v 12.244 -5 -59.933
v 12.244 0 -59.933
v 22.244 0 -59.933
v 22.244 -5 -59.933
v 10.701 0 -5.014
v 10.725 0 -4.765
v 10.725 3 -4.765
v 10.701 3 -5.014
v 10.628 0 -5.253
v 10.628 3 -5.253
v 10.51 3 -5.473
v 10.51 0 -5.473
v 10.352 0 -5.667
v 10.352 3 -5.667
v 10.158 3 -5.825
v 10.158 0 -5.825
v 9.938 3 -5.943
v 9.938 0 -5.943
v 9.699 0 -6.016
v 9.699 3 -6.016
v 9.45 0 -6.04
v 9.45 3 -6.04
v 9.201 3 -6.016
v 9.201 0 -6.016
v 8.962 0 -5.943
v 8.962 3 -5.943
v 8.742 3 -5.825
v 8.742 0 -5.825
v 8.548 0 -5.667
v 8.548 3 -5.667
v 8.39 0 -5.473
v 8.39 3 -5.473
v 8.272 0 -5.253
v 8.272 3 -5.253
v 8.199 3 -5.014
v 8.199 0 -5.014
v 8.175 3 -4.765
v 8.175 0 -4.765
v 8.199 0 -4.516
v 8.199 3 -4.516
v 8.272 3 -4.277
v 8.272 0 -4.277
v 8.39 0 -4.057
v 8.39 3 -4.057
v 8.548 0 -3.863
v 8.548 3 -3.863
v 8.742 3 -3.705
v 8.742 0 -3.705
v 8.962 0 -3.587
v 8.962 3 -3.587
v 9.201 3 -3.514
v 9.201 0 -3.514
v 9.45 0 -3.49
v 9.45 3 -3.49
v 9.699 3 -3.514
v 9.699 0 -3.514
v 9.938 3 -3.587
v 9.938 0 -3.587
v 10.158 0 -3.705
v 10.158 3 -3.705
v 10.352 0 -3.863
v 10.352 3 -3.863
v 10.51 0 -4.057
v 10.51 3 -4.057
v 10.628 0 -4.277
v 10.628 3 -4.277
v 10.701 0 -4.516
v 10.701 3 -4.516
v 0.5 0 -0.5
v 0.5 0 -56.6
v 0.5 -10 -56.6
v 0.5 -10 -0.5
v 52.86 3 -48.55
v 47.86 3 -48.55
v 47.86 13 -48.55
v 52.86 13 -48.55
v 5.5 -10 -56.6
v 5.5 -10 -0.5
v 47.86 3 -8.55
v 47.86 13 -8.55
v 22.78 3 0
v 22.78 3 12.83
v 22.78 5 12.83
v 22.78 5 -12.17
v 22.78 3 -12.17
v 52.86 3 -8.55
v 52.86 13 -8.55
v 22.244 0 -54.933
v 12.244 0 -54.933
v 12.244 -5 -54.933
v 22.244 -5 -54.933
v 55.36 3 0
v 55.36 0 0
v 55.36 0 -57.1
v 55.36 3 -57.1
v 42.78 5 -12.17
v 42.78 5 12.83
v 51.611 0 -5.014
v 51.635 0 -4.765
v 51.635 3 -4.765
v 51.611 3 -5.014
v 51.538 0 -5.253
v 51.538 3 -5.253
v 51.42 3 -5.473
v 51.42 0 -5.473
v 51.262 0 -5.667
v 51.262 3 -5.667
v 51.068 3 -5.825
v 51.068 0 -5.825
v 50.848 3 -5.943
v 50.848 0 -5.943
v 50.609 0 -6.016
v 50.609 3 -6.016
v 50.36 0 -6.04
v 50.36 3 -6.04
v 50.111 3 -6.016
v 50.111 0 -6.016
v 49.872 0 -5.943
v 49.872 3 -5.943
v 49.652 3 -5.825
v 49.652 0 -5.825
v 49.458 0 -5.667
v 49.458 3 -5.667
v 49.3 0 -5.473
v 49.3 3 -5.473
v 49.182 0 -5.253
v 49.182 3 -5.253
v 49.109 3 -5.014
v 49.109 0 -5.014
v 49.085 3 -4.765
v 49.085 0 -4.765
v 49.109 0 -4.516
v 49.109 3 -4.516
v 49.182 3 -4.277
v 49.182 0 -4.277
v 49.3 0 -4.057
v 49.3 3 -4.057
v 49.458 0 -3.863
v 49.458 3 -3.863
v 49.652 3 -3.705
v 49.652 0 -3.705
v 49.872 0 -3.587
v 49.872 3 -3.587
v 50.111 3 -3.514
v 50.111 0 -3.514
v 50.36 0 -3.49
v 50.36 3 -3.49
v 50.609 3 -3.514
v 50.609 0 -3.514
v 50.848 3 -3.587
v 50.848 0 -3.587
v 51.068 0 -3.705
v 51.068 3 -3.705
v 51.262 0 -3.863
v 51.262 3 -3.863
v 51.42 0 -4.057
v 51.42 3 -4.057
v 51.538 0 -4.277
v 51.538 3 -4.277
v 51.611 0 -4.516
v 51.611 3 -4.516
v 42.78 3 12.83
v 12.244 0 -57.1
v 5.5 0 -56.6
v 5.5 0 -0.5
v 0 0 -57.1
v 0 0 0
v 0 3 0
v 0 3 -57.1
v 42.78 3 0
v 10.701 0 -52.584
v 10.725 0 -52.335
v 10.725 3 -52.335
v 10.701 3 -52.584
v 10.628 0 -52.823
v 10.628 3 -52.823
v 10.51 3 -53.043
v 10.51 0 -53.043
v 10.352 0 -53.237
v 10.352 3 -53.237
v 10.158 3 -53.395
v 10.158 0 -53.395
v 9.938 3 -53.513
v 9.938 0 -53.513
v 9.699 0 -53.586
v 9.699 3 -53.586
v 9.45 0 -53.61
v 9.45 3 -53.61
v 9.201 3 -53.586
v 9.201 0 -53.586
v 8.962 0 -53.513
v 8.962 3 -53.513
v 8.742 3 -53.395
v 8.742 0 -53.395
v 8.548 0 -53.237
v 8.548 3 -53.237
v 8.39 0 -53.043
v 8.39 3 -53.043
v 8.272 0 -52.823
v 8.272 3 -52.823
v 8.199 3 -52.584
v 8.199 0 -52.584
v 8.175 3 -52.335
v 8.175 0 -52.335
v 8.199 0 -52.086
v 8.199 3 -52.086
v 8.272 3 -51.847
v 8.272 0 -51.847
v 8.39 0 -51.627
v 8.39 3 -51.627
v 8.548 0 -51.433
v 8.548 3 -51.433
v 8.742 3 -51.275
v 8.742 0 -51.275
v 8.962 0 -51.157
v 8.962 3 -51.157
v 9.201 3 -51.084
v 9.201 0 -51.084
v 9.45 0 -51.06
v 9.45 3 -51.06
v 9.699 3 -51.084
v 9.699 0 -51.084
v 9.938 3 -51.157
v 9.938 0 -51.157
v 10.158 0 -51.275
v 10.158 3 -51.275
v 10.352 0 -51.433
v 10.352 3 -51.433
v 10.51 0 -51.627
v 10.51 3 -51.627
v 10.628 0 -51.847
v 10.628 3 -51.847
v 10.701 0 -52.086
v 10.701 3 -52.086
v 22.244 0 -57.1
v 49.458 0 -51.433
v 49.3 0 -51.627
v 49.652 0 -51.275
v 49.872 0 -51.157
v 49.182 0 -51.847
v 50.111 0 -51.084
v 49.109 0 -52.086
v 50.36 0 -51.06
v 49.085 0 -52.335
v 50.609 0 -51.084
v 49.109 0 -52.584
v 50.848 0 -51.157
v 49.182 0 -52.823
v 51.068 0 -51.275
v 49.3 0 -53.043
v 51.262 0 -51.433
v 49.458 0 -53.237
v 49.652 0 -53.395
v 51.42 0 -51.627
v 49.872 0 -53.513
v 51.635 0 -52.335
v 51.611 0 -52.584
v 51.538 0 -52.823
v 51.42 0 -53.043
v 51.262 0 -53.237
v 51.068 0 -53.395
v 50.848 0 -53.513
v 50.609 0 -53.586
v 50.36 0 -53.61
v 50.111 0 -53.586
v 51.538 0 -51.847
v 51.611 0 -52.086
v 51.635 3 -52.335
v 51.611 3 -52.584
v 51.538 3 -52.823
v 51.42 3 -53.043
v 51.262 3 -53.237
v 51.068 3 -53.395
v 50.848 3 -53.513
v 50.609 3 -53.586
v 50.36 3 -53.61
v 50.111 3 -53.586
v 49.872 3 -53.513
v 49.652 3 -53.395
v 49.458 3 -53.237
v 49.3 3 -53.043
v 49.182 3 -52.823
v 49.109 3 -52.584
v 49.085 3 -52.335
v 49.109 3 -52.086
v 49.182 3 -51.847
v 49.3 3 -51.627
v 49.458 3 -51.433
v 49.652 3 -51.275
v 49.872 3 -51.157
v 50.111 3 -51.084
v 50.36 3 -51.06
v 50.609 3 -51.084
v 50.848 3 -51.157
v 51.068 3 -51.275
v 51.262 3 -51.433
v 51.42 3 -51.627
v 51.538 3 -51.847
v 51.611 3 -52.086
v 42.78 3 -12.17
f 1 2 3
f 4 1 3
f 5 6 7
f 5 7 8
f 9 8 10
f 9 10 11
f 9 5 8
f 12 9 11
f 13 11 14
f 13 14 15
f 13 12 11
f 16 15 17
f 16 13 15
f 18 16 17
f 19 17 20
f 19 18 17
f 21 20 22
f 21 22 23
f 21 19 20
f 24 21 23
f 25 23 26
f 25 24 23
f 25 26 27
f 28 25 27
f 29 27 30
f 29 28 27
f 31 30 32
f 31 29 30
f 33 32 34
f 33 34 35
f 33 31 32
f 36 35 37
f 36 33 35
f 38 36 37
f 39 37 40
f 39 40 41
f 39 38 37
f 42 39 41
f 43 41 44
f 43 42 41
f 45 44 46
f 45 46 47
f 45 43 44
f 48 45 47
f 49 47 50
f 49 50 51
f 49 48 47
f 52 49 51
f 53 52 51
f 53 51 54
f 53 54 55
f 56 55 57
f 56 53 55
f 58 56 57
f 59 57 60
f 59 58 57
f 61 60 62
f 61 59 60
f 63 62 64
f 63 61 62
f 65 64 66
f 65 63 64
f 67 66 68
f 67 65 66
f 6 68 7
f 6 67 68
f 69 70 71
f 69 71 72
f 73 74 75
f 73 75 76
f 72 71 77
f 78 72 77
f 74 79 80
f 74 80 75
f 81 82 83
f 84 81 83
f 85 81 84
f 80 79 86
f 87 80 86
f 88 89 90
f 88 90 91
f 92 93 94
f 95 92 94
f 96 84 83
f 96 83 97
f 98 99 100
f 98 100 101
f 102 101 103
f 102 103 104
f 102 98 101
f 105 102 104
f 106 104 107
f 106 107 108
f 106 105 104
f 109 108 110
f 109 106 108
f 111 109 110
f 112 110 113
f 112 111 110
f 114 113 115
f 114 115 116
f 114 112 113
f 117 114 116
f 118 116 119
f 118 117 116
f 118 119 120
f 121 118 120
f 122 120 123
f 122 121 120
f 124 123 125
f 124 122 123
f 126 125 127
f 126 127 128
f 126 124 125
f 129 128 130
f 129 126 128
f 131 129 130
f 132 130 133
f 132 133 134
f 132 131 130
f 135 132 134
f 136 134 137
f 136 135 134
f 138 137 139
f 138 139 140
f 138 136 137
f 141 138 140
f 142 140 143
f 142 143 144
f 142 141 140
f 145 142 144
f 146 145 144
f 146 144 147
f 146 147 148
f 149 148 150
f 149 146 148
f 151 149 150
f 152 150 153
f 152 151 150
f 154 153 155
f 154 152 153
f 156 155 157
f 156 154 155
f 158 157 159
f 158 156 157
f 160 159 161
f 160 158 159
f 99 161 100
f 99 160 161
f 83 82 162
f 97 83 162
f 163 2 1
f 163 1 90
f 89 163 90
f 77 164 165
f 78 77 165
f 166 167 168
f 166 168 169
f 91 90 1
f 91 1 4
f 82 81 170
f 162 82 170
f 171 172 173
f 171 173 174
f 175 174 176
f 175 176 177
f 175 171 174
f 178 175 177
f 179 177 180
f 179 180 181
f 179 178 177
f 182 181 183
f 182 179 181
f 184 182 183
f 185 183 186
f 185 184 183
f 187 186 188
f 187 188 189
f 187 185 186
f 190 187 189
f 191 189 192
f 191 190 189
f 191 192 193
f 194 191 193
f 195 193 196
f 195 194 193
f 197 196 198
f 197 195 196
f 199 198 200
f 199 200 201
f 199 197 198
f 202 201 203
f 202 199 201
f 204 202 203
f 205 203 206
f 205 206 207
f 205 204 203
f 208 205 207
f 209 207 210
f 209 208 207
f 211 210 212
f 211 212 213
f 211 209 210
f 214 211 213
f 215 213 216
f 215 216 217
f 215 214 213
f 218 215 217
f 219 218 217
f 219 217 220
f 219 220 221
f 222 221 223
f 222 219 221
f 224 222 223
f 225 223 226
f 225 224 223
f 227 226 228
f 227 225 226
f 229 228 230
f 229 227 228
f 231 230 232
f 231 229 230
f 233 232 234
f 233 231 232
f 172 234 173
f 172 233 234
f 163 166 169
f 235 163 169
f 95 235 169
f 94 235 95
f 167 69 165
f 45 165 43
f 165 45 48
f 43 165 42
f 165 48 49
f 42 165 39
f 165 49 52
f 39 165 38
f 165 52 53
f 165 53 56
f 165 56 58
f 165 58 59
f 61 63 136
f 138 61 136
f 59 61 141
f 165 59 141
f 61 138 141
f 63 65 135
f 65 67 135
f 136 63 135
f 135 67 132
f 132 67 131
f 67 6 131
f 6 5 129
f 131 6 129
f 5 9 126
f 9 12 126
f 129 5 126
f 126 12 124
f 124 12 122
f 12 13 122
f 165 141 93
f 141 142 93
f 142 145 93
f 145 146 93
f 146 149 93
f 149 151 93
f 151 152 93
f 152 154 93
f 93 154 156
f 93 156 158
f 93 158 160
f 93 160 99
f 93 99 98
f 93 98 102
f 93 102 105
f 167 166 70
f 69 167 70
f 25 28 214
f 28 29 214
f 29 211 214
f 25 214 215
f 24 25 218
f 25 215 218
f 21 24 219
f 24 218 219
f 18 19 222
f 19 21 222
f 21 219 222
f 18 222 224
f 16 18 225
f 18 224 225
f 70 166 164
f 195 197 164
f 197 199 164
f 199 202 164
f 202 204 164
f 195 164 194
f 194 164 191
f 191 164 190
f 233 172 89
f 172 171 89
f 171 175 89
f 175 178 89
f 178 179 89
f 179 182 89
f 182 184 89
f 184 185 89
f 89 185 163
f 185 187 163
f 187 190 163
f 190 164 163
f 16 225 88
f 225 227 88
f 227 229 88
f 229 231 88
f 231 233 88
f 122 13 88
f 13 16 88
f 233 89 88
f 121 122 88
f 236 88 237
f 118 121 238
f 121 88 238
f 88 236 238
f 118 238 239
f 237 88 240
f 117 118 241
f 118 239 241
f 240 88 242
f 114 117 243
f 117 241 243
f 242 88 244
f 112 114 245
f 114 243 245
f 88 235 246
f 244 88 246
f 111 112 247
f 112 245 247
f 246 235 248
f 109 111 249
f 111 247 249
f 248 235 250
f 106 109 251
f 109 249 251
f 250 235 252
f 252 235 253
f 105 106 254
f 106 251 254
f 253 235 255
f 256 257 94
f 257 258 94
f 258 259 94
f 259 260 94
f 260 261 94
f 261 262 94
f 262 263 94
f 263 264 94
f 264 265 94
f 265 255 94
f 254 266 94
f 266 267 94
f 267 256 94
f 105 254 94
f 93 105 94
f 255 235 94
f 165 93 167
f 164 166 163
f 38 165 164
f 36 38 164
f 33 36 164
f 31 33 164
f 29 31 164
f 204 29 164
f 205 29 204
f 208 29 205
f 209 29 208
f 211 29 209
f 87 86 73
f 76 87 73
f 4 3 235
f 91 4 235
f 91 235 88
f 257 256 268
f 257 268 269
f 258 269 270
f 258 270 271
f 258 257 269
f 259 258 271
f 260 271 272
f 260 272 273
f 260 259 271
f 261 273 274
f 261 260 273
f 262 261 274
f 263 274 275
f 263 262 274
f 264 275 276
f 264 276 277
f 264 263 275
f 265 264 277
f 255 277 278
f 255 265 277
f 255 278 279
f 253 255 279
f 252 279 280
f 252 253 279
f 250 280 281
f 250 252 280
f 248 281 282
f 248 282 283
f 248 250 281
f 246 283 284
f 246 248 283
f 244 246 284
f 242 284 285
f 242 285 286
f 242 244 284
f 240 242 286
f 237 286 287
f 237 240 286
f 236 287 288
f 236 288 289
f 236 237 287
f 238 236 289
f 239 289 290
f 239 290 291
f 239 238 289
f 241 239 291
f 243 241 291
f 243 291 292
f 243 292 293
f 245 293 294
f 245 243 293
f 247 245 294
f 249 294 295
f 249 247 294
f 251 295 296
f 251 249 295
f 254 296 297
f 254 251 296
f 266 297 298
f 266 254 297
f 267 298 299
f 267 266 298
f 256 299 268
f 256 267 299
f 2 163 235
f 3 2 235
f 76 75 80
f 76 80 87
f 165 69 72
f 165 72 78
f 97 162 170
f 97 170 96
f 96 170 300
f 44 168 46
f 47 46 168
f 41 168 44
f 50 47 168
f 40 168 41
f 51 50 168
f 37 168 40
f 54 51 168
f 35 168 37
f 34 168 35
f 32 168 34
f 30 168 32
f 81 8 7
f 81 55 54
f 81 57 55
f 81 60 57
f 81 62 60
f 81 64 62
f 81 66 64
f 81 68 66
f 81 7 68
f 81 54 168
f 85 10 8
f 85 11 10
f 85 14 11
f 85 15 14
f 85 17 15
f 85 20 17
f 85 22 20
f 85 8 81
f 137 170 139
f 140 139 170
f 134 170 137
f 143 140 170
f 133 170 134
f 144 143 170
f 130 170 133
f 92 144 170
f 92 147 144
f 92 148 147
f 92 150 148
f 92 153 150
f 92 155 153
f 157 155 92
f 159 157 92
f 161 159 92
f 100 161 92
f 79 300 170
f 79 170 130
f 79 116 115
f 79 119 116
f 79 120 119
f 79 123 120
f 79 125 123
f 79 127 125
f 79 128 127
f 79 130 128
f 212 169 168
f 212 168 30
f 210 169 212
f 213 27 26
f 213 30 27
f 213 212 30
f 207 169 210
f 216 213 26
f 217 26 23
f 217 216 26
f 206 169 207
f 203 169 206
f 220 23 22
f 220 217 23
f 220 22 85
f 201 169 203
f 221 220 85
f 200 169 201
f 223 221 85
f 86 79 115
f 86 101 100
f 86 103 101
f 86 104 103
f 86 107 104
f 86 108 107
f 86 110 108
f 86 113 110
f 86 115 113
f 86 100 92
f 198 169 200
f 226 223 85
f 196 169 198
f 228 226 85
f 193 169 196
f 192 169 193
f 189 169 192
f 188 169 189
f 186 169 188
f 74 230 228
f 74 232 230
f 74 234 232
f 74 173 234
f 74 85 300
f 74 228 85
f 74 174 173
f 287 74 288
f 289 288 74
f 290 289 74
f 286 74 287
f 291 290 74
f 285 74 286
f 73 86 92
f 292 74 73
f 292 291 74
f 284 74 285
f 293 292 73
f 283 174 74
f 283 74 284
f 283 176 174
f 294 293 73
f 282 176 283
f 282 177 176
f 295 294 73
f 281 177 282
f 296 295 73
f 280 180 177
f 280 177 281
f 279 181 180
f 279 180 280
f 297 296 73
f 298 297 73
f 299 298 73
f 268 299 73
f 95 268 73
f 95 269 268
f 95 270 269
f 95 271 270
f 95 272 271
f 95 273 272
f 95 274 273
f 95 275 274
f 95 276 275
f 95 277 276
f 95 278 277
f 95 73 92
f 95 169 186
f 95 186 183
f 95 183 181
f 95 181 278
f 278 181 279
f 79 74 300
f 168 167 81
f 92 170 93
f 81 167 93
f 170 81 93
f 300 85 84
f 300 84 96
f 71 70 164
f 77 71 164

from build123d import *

# Parameters (mm, degrees)
ESQUISSE1_W      = 55.36
ESQUISSE1_H      = 57.1
ESQUISSE1_R      = 1.275
EXTRUSION1_DEPTH = 3
ESQUISSE2_W      = 5
ESQUISSE2_H      = 40
EXTRUSION2_DEPTH = 10
ESQUISSE3_W      = 20
ESQUISSE3_H      = 25
EXTRUSION3_DEPTH = 2
ESQUISSE4_W      = 5
ESQUISSE4_H      = 56.1
EXTRUSION4_DEPTH = 10
ESQUISSE5_W      = 10
ESQUISSE5_H      = 5
EXTRUSION5_DEPTH = 5


with BuildPart() as part:
    # Esquisse1 → Extrusion1 (new body)
    with BuildSketch(Plane(origin=(0, 0, 0), x_dir=(1, 0, 0), z_dir=(0, 1, 0))):
        with Locations((27.68, 28.55)):
            Rectangle(ESQUISSE1_W, ESQUISSE1_H)
        with Locations((9.45, 52.335)):
            Circle(ESQUISSE1_R, mode=Mode.SUBTRACT)
        with Locations((50.36, 52.335)):
            Circle(ESQUISSE1_R, mode=Mode.SUBTRACT)
        with Locations((9.45, 4.765)):
            Circle(ESQUISSE1_R, mode=Mode.SUBTRACT)
        with Locations((50.36, 4.765)):
            Circle(ESQUISSE1_R, mode=Mode.SUBTRACT)
    extrude(amount=EXTRUSION1_DEPTH)

    # Esquisse2 → Extrusion2 (add)
    with BuildSketch(Plane(origin=(0, 3, 0), x_dir=(1, 0, 0), z_dir=(0, 1, 0))):
        with Locations((50.36, 28.55)):
            Rectangle(ESQUISSE2_W, ESQUISSE2_H)
    extrude(amount=EXTRUSION2_DEPTH)

    # Esquisse3 → Extrusion3 (add)
    with BuildSketch(Plane(origin=(0, 3, 0), x_dir=(1, 0, 0), z_dir=(0, 1, 0))):
        with Locations((32.78027682, -0.33040493)):
            Rectangle(ESQUISSE3_W, ESQUISSE3_H)
    extrude(amount=EXTRUSION3_DEPTH)

    # Esquisse4 → Extrusion4 (add)
    with BuildSketch(Plane.XZ):
        with Locations((3, -28.55)):
            Rectangle(ESQUISSE4_W, ESQUISSE4_H)
    extrude(amount=EXTRUSION4_DEPTH)

    # Esquisse5 → Extrusion5 (add)
    with BuildSketch(Plane.XZ):
        with Locations((17.244150354, -57.432970226)):
            Rectangle(ESQUISSE5_W, ESQUISSE5_H)
    extrude(amount=EXTRUSION5_DEPTH)


solid = part.part
